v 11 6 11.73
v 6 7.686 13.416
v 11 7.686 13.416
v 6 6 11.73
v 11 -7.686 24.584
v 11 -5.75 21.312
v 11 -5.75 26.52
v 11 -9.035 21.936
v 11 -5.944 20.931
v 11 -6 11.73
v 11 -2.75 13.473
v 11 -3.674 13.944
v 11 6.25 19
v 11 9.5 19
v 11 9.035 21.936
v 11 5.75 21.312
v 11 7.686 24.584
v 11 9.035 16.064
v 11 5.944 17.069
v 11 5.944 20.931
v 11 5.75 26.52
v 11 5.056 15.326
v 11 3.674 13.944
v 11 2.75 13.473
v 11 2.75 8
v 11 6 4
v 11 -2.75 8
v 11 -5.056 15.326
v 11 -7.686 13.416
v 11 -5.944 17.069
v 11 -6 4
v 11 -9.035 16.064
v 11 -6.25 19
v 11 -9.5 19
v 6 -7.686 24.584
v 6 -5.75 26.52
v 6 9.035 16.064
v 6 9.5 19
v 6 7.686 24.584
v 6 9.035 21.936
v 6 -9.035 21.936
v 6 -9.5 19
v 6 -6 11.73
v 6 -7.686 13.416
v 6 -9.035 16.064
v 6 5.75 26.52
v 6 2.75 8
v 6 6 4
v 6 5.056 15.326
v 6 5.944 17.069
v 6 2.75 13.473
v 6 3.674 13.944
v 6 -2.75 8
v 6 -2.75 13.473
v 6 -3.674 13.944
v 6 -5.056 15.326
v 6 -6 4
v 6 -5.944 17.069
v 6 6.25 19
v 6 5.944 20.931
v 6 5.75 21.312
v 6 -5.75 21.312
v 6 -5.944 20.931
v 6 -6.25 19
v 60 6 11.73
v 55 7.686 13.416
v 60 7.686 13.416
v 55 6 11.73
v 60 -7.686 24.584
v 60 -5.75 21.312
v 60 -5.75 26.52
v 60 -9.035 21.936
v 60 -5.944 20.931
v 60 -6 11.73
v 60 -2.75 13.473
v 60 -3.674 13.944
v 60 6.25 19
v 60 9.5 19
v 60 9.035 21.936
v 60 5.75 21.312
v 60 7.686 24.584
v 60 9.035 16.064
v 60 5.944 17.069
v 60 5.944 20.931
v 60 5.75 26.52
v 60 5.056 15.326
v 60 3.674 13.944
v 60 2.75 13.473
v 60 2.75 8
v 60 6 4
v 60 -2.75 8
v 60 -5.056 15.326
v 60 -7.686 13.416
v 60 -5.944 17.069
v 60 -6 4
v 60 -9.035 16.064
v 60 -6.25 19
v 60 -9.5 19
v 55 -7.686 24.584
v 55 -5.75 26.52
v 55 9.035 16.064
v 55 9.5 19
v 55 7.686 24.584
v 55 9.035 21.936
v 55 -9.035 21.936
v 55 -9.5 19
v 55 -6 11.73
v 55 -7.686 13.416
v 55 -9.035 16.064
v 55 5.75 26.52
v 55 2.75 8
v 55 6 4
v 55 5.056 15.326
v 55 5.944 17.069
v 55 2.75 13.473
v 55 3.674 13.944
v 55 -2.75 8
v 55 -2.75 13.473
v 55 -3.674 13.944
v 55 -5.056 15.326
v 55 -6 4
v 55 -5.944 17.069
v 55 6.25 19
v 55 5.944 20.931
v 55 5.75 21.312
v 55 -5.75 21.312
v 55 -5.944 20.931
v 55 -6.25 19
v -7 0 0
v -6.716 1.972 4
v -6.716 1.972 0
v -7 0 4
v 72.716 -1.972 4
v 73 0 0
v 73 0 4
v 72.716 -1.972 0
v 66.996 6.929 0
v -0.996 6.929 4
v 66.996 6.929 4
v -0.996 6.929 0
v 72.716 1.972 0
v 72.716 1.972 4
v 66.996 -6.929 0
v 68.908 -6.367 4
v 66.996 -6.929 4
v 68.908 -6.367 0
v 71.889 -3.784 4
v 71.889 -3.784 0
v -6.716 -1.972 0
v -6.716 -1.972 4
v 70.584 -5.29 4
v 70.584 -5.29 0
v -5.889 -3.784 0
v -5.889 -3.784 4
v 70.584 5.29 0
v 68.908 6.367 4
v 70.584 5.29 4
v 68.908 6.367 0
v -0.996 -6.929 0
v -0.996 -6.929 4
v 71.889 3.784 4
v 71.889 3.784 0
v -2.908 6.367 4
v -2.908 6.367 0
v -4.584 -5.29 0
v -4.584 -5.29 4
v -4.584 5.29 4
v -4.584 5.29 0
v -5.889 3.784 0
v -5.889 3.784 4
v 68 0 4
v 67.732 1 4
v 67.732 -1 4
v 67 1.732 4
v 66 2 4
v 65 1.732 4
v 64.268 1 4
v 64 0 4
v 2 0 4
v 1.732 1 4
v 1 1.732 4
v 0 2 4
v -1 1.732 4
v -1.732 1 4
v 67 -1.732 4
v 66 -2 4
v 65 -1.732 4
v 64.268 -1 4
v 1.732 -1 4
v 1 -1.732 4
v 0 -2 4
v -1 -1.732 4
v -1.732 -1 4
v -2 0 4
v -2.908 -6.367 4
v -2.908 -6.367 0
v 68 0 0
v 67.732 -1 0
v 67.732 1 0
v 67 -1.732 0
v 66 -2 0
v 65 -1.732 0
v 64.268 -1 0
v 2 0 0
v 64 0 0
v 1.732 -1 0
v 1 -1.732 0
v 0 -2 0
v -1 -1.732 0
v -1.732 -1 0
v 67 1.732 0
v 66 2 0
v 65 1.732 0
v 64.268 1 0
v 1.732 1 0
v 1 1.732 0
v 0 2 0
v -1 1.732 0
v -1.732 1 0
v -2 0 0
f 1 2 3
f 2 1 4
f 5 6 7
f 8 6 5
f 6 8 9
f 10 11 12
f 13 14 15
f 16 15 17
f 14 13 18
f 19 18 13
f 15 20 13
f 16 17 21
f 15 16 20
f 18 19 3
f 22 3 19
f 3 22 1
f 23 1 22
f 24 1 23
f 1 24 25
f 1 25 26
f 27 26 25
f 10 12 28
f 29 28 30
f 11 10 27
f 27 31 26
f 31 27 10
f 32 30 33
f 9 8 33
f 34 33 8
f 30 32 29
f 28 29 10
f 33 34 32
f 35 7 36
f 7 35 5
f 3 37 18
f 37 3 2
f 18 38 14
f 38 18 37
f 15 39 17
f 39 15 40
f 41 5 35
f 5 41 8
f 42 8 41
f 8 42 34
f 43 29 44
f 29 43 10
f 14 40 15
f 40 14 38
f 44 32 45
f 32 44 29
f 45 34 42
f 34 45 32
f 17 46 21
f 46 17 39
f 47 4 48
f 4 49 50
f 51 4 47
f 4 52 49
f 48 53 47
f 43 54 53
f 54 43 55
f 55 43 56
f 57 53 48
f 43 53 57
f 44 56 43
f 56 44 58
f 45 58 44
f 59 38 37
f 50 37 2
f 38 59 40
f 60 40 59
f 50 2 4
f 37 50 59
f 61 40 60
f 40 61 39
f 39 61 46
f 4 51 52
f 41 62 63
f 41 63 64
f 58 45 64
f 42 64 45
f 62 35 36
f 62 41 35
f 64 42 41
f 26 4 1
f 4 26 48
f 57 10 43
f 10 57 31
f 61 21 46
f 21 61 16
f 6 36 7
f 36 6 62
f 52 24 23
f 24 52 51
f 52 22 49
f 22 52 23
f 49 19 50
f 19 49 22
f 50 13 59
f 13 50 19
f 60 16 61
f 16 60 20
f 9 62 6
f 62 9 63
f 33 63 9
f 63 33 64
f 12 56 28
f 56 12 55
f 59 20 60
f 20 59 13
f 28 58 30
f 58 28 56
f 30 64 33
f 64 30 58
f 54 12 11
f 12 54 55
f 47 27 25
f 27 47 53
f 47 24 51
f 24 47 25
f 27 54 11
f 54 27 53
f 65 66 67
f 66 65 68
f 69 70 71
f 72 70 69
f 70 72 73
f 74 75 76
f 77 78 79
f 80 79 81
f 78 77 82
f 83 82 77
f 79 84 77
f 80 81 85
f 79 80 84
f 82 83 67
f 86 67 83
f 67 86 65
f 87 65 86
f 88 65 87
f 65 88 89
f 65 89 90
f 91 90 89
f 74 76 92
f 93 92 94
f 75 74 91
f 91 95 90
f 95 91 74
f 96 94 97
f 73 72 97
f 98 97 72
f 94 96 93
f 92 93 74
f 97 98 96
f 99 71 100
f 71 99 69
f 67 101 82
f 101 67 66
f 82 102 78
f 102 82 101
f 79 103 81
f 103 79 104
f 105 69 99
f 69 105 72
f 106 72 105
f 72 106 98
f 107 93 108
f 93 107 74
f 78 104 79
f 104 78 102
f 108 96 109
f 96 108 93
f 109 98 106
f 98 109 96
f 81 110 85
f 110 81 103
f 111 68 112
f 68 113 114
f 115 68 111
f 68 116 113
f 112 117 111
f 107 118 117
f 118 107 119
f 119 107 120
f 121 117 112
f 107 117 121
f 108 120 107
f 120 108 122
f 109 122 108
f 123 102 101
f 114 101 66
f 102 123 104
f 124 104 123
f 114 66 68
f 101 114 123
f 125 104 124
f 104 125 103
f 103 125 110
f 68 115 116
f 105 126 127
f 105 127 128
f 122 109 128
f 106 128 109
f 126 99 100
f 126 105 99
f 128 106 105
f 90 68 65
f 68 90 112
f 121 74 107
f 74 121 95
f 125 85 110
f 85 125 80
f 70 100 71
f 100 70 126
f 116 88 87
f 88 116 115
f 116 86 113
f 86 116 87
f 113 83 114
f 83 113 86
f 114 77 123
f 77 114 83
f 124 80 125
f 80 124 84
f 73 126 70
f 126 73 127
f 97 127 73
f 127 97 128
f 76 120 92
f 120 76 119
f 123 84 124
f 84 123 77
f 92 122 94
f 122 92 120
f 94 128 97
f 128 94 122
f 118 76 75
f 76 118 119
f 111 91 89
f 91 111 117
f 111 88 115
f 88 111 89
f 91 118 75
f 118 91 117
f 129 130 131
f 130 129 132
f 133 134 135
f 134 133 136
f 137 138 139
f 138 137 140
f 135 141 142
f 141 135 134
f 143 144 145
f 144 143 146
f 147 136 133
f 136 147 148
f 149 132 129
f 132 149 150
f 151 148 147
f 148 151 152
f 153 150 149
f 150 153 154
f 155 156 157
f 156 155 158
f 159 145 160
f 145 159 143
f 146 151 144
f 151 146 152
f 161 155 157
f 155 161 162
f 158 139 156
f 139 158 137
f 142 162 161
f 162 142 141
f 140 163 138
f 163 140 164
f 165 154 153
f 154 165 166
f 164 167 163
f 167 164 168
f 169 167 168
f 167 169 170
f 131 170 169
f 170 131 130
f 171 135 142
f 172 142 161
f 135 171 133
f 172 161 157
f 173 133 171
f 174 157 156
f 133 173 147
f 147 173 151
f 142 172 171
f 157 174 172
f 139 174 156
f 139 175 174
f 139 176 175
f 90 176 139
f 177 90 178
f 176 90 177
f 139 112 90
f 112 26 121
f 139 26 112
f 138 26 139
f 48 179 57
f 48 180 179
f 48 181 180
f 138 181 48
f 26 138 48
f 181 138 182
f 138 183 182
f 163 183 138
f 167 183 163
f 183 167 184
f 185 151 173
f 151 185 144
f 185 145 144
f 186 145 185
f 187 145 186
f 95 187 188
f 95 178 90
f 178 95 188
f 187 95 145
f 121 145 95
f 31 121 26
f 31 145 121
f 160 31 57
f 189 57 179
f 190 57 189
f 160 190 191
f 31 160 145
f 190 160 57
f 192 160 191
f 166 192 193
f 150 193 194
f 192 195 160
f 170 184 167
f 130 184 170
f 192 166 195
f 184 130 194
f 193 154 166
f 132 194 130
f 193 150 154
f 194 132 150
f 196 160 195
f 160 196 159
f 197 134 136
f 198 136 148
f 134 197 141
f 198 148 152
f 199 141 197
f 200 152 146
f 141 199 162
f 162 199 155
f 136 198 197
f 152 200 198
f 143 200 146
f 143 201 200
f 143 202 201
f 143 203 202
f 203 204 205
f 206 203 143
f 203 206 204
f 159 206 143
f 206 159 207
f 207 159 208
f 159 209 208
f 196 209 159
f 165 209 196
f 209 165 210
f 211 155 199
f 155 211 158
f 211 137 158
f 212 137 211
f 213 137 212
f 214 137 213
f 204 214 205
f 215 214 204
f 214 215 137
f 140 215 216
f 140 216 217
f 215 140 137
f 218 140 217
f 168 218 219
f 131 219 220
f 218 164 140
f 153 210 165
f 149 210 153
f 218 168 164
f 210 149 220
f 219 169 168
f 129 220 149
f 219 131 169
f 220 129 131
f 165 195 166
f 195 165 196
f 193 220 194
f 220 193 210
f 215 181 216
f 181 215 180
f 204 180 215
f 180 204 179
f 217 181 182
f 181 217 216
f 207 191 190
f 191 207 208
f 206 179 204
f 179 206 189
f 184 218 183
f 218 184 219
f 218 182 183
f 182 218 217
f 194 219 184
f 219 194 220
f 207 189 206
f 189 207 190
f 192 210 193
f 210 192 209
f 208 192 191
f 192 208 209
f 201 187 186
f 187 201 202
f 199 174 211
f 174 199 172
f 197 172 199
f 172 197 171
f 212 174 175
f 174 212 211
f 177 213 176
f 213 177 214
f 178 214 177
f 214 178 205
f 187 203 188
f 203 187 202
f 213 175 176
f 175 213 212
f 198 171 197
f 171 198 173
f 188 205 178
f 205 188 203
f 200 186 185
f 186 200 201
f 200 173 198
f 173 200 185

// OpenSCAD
//
// Crank Clip
//

base_w = 14.0;
base_h =  4.0;
base_len = 66.0;  // center-to-center, not total length

arm_thick = 5.0;
arm_pitch = 49.0;
arm_ctr_z = 15.0;
arm_od = 19.0;

module clip_arm () {

    difference () {
        // clip_arm_mold()
        union () {
            translate([(arm_thick/2)*-1, 0, arm_ctr_z])
                rotate(90.0, [0,1,0])
                    cylinder(arm_thick, r=arm_od/2, $fn=20);
            translate([(arm_thick/2)*-1, (12.0/2)*-1, -0.01])
                cube([arm_thick, 12.0, arm_ctr_z + 0.01]);
        }

        // The large gam through which the crank is jammed
        translate([((arm_thick + 0.02)/2)*-1, (11.5/2)*-1, arm_ctr_z])
            cube([arm_thick + 0.02, 11.5, arm_od/2 + 0.01]);
        // The round part in which the crank rests
        translate([0, 0, arm_ctr_z])
            rotate(90.0, [0,1,0])
                translate([0, 0, ((arm_thick + 0.02)/2)*-1])
                    cylinder(arm_thick + 0.02, r=12.5/2, $fn=20);
        // The extra slip for flexibility
        translate([((arm_thick + 0.02)/2)*-1, (5.5/2)*-1, 4.0])
            cube([arm_thick + 0.02, 5.5, arm_od/2 + 0.01]);
    }
}

module clip_mold () {

    // The base
    hull () {
        cylinder(base_h, r=base_w/2);
        translate([base_len, 0, 0])
            cylinder(base_h, r=base_w/2);
    }

    // The arms
    translate([(base_len - arm_pitch)/2, 0, base_h])
        clip_arm();
    translate([base_len - (base_len - arm_pitch)/2, 0, base_h])
        clip_arm();
}

module hole () {
    translate([0, 0, -0.01])
        cylinder(base_h + 0.02, r=4.0/2, $fn=12);
}

module clip () {

    difference () {
        clip_mold();

        hole();
        translate([base_len, 0, 0])
            hole();
    }
}

clip();
